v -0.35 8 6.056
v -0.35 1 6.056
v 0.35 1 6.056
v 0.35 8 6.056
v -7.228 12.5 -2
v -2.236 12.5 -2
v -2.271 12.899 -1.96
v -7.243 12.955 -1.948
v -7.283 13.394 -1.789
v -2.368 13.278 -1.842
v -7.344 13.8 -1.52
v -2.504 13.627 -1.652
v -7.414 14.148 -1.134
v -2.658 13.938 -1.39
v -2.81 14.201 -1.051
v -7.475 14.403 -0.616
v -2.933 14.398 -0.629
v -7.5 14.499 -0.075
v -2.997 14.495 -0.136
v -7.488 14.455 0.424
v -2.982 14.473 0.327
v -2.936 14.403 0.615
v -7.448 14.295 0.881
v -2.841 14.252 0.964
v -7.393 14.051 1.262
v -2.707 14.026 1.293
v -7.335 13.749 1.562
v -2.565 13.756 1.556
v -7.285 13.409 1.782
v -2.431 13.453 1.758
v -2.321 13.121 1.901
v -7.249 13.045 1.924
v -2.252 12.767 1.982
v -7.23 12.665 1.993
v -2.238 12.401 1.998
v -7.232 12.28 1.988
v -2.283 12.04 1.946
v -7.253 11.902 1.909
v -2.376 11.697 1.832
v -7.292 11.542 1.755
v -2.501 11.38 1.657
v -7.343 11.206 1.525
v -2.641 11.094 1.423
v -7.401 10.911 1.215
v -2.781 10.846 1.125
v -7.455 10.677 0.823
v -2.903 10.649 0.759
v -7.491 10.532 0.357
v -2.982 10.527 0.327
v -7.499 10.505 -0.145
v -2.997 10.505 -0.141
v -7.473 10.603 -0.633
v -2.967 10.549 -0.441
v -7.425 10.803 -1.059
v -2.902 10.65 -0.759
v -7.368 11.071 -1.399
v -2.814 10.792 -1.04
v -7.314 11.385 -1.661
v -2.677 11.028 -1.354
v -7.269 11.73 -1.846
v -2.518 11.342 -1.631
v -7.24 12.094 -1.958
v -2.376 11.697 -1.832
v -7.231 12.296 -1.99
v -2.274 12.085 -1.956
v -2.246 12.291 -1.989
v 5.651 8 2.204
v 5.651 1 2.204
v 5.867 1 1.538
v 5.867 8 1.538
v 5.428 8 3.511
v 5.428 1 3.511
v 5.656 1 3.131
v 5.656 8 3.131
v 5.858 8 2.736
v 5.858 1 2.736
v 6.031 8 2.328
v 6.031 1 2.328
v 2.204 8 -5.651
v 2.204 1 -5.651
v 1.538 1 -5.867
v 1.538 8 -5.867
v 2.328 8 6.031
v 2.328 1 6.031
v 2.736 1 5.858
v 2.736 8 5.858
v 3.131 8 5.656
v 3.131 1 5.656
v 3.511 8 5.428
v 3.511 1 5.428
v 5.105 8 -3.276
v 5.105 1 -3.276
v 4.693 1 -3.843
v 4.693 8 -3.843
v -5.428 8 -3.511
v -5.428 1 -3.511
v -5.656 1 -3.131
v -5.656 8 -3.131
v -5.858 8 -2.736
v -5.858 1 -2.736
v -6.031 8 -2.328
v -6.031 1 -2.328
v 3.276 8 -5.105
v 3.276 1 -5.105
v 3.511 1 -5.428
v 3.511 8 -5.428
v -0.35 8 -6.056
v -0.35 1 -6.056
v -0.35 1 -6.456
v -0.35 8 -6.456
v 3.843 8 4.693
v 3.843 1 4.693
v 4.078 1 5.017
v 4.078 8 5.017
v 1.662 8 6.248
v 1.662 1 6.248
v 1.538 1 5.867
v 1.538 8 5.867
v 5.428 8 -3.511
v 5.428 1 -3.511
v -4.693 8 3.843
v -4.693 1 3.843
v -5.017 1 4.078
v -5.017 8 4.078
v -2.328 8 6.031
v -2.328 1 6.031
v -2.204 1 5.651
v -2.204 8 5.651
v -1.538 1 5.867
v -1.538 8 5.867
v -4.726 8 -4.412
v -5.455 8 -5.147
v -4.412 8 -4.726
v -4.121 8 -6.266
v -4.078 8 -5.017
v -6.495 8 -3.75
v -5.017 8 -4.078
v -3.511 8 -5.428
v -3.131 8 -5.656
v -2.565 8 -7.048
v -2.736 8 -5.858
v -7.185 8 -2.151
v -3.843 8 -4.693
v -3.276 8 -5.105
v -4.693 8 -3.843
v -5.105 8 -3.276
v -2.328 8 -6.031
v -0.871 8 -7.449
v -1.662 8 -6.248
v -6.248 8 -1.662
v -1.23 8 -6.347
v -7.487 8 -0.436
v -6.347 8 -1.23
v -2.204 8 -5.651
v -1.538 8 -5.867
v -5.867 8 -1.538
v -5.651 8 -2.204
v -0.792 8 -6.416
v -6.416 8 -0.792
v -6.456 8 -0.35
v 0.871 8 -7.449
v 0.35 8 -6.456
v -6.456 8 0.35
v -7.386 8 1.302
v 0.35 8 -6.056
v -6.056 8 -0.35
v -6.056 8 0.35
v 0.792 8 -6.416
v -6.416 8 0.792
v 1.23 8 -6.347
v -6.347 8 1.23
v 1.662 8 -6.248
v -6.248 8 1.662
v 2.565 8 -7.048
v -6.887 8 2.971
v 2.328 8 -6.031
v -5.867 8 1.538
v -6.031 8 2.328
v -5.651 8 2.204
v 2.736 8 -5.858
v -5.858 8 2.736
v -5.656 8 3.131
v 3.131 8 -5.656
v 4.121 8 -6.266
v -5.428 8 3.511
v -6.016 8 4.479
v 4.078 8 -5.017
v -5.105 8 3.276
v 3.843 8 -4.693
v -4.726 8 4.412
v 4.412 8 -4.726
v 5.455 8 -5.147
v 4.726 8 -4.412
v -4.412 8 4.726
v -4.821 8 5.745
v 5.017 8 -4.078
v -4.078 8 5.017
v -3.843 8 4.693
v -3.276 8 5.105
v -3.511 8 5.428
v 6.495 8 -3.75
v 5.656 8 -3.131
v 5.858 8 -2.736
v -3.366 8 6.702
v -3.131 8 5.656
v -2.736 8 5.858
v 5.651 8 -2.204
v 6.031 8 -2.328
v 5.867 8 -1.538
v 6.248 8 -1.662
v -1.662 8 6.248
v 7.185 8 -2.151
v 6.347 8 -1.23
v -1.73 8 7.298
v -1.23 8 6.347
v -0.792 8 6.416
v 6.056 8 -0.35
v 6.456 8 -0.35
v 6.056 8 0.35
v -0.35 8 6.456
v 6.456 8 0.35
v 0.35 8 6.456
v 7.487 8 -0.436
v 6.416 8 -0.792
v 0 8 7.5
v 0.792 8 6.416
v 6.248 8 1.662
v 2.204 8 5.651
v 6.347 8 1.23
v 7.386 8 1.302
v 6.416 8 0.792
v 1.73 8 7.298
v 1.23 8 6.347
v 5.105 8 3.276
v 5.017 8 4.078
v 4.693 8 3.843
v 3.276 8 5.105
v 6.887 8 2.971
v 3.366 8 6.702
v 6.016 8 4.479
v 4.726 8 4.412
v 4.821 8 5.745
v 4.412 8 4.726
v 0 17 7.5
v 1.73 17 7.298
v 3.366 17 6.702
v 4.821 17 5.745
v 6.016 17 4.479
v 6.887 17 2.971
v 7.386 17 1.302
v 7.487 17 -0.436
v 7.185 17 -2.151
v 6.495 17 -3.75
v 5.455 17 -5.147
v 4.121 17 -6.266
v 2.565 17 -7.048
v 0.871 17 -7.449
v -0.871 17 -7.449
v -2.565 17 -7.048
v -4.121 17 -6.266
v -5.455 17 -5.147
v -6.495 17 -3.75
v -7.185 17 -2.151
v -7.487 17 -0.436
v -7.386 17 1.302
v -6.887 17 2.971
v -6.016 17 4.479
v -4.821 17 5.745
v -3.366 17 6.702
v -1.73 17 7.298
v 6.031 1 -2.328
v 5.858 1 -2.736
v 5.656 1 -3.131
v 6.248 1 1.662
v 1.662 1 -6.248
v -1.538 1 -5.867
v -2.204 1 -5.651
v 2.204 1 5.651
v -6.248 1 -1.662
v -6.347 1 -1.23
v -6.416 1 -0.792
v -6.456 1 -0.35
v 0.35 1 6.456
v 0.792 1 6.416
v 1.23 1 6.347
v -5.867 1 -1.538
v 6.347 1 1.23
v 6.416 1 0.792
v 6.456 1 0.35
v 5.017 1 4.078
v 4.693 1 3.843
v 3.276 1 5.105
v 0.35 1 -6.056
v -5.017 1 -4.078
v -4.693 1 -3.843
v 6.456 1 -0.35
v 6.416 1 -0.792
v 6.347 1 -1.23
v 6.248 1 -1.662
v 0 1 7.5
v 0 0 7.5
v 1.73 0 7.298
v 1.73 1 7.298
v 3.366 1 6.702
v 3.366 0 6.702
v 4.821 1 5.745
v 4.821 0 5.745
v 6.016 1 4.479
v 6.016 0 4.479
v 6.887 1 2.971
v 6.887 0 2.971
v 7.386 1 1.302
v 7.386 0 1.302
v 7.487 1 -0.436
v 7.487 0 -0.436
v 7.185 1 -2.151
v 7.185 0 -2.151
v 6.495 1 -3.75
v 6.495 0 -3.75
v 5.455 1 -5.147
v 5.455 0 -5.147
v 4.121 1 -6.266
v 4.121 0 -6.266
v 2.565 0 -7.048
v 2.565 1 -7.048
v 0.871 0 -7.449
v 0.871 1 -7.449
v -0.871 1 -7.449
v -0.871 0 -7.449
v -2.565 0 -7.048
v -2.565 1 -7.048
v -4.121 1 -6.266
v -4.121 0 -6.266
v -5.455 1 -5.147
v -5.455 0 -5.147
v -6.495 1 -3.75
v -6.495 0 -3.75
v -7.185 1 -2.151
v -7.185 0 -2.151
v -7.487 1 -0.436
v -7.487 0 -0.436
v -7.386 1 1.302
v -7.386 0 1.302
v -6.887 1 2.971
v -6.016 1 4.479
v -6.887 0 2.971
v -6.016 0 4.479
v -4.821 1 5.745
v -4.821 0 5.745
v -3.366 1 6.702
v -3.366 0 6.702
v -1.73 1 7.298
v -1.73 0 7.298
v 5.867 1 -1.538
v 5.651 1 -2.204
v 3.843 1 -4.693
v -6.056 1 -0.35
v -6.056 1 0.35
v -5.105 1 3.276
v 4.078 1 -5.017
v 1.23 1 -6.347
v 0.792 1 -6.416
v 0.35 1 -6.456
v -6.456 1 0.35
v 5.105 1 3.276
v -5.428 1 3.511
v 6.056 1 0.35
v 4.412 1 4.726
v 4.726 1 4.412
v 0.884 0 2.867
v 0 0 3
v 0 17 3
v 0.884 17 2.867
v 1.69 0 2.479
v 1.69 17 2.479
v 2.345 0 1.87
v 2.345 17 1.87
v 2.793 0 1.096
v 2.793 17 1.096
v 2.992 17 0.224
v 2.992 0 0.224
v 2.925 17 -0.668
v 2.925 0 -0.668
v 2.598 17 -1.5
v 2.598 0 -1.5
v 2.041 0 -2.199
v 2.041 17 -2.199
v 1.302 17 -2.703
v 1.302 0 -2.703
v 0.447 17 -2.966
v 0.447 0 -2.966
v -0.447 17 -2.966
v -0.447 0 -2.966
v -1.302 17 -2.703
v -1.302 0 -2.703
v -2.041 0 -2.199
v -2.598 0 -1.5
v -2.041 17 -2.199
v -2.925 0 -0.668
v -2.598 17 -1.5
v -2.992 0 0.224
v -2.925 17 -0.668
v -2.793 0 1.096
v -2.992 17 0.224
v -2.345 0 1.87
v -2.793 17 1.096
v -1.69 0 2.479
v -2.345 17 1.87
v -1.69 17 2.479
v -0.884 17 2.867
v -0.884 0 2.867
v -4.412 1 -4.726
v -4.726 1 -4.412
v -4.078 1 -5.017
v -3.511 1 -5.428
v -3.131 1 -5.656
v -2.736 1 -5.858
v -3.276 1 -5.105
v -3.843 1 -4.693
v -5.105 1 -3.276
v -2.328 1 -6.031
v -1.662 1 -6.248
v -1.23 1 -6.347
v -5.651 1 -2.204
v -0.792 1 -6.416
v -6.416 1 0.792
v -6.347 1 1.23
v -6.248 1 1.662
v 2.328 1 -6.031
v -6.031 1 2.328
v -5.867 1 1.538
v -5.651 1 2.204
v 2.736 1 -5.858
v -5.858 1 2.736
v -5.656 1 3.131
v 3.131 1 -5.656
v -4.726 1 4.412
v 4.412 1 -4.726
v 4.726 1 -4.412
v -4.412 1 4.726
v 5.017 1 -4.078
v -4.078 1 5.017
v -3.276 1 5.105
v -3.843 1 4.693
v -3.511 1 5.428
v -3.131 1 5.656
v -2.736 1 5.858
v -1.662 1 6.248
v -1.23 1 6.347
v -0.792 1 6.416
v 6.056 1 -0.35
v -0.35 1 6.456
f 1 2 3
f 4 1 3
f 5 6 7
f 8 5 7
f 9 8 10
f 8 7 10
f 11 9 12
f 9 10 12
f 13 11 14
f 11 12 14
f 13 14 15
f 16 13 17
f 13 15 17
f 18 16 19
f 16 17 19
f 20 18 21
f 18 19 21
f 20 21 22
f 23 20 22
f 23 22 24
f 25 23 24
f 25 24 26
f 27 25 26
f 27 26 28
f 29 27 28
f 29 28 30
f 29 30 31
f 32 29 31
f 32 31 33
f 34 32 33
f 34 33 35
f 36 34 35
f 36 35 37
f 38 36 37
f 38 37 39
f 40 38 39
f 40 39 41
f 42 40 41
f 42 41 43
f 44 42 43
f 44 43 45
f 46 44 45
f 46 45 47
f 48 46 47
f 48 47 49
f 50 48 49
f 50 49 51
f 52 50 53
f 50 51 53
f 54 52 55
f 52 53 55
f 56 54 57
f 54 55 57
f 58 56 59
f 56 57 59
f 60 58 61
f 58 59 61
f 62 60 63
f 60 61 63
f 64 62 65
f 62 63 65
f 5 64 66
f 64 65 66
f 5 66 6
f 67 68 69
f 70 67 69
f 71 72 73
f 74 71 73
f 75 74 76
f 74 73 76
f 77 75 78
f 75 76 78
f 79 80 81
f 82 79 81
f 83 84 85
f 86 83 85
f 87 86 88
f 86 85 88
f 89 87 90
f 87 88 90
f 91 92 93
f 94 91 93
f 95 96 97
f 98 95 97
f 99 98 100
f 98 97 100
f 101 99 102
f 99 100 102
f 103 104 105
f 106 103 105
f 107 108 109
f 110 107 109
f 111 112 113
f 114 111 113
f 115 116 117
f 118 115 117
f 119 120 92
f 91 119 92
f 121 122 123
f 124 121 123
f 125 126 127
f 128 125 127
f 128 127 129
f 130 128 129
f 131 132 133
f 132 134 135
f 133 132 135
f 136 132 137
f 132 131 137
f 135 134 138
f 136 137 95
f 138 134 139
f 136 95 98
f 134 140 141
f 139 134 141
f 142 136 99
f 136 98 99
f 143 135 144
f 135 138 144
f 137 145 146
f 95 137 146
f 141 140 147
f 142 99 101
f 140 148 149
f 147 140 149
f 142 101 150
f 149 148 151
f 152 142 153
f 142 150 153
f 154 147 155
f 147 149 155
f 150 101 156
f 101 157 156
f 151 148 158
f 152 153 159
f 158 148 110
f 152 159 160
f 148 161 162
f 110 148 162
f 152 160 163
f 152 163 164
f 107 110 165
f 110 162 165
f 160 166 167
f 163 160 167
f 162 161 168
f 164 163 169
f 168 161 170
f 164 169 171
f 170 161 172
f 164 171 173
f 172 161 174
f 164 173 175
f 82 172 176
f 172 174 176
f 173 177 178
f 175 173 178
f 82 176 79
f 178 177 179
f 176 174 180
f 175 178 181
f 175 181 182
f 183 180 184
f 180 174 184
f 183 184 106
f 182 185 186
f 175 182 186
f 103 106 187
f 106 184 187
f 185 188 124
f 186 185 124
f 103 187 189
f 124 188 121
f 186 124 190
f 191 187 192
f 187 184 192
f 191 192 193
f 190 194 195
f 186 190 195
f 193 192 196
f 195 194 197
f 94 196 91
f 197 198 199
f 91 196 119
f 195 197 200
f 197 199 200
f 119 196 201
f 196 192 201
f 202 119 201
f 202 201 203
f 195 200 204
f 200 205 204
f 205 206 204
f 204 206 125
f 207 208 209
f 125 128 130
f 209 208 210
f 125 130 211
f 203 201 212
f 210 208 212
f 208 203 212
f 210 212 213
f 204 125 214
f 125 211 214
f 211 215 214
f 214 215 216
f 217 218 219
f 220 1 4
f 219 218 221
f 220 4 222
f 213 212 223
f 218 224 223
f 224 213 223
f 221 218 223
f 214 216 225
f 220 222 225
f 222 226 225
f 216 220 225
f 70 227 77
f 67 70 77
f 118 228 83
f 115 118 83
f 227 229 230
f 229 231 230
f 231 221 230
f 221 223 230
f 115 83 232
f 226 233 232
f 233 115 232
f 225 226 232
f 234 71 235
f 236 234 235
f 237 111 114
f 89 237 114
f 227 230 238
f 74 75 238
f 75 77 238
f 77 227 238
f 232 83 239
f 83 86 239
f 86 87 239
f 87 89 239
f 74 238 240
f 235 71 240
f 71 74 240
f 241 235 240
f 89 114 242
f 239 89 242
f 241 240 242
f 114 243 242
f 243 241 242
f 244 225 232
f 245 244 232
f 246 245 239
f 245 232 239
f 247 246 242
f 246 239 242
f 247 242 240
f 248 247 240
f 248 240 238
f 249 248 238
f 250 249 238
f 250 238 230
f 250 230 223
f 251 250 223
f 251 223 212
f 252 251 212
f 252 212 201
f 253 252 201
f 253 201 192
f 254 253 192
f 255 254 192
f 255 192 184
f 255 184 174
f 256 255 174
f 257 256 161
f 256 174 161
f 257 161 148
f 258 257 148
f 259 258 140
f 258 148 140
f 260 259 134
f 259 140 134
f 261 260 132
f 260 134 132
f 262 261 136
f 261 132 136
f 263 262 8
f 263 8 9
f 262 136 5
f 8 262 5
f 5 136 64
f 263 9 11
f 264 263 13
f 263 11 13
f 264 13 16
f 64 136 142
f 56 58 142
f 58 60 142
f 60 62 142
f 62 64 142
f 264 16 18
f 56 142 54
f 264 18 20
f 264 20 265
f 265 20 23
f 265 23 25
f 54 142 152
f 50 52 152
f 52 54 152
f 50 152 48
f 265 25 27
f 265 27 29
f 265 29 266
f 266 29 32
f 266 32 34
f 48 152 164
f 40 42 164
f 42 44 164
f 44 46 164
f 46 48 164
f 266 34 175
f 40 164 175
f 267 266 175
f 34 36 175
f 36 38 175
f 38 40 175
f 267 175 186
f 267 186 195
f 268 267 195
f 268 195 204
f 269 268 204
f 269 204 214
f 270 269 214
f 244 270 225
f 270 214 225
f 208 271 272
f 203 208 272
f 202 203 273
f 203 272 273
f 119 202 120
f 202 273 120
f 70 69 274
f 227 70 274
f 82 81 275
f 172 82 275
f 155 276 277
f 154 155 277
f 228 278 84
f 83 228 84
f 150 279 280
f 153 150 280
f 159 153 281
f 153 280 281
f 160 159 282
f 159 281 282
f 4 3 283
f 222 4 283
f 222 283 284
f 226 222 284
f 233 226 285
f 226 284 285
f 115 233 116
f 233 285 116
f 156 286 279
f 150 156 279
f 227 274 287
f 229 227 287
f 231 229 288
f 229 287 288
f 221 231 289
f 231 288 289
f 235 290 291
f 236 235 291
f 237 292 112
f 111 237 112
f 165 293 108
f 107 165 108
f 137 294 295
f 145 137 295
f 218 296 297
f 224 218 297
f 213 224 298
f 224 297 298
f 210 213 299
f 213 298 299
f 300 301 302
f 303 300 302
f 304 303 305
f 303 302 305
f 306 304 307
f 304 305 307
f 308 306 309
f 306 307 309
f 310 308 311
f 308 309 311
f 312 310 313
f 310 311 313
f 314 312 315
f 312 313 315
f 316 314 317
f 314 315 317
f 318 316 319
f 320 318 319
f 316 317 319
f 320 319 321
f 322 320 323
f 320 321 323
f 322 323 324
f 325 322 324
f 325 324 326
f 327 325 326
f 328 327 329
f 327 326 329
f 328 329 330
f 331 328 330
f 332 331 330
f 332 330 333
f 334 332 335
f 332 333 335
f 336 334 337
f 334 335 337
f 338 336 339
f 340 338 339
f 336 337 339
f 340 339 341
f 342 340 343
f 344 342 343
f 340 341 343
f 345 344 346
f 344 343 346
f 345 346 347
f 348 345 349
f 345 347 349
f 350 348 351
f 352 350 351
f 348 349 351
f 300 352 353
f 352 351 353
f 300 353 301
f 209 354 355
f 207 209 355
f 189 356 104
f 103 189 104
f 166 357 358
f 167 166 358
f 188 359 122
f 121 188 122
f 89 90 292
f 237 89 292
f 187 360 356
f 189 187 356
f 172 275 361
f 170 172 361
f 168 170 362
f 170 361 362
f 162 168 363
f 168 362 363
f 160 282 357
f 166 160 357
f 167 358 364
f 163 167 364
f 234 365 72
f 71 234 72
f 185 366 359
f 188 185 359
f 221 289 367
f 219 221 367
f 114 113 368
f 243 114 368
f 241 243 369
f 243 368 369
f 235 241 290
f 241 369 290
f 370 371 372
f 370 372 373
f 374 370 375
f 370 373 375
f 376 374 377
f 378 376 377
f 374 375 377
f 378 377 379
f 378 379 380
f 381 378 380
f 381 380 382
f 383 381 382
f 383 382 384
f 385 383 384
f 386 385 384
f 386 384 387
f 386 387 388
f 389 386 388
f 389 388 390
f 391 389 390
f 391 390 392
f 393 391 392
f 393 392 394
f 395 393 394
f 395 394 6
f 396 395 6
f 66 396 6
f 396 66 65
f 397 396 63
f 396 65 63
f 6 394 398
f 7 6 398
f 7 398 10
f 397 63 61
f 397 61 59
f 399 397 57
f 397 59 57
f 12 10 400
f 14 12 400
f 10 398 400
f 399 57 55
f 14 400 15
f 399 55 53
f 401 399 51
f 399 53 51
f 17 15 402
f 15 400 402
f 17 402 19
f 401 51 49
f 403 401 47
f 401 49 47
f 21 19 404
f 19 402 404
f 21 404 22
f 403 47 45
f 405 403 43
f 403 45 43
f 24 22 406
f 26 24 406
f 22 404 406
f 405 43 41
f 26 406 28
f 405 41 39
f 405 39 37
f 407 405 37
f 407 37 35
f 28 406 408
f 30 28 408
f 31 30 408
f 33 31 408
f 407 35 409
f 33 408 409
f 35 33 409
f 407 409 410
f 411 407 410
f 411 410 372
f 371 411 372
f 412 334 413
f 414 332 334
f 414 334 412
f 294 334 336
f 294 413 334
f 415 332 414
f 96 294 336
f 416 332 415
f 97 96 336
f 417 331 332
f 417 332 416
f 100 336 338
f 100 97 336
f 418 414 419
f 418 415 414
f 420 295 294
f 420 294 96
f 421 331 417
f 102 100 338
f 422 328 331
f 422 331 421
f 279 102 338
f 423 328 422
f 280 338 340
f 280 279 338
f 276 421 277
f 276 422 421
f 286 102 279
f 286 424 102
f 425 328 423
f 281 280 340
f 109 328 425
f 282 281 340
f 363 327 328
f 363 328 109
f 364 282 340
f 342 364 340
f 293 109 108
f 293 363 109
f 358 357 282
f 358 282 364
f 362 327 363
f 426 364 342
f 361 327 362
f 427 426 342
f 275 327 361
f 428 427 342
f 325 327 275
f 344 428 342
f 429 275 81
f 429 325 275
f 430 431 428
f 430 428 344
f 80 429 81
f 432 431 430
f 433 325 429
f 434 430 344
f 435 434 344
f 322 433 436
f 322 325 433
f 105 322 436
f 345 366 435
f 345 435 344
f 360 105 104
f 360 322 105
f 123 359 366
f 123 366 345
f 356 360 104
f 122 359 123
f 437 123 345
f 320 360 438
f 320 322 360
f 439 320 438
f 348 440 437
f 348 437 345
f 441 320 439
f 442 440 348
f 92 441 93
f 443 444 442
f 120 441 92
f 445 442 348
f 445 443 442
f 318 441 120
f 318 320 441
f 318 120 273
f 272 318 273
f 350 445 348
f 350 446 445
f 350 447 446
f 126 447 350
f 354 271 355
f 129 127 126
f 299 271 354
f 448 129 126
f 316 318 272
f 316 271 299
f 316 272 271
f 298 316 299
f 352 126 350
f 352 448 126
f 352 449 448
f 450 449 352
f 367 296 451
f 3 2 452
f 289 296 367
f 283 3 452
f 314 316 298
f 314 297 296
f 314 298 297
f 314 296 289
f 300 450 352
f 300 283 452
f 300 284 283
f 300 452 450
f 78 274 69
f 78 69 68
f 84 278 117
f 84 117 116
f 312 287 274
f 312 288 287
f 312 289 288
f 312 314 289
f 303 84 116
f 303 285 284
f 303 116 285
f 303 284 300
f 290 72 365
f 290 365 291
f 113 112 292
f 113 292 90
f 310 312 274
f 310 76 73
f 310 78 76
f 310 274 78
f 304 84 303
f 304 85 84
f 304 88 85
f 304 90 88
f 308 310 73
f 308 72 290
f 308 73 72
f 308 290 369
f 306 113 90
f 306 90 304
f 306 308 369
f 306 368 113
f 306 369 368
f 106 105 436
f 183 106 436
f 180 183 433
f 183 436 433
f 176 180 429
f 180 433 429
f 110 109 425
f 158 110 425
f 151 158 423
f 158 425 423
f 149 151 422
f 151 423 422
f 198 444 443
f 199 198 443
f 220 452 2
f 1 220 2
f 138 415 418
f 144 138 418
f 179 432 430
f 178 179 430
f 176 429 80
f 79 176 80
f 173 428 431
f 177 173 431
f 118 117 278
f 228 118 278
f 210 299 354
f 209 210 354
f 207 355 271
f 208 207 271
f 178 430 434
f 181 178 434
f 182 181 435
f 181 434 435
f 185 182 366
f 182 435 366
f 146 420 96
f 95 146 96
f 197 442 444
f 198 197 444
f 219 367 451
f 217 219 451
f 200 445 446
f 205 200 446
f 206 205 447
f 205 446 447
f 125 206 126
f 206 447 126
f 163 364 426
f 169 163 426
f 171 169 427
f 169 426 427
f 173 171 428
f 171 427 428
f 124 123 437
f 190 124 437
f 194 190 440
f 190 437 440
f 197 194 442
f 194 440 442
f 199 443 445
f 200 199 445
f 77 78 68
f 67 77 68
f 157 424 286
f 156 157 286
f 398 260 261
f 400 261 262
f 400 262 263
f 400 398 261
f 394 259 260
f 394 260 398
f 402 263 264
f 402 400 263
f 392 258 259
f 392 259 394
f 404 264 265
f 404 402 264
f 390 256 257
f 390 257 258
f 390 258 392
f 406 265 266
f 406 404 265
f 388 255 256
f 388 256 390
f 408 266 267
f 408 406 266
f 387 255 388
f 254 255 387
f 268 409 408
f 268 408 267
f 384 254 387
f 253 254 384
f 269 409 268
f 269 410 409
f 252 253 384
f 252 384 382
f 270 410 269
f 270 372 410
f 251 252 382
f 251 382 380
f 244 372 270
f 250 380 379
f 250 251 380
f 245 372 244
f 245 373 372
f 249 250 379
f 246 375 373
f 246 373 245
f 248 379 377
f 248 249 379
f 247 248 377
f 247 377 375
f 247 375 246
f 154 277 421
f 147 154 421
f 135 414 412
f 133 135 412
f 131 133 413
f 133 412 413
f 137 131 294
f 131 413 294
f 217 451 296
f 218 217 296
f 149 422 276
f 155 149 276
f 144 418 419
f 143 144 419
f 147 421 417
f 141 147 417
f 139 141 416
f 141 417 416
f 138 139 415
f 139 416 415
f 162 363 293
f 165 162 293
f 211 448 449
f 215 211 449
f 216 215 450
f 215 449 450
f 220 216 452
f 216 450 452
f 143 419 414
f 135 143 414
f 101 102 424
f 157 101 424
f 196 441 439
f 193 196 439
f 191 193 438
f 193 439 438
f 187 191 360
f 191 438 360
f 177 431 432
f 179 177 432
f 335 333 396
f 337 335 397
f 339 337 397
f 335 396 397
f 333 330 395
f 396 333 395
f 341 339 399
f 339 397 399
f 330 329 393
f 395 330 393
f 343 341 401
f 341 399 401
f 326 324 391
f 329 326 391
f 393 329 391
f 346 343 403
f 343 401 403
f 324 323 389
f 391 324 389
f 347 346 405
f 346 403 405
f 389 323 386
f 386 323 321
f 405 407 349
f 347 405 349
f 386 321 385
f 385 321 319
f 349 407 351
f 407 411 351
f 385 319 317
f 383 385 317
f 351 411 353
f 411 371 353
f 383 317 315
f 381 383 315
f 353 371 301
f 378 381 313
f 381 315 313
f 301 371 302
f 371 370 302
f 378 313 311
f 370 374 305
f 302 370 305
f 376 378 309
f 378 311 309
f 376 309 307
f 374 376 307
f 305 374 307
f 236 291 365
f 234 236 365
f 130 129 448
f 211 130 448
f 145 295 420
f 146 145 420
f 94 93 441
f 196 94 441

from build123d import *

# Parameters (mm, degrees)
SKETCH_1_R               = 7.5
EXTRUDE_1_DEPTH          = 1
EXTRUDE_2_DEPTH          = 7
SKETCH_3_R               = 7.5
EXTRUDE_3_DEPTH          = 9
CUT_EXTRUDE_1_REACH      = 22.037
SKETCH_4_R               = 3
CUT_EXTRUDE_2_REACH      = 22.037
CUT_EXTRUDE_2_END_RADIUS = 7.5
SKETCH_5_R               = 2


with BuildPart() as part:
    # 草图1 → 凸台-拉伸1 (new body)
    with BuildSketch(Plane(origin=(0, 0, 0), x_dir=(1, 0, 0), z_dir=(0, 1, 0))):
        with Locations(Location((0, 0, 0), (0, 0, 270))):
            Circle(SKETCH_1_R)
    extrude(amount=EXTRUDE_1_DEPTH)

    # 草图2 → 凸台-拉伸2 (add)
    with BuildSketch(Plane(origin=(0, 1, 0), x_dir=(1, 0, 0), z_dir=(0, 1, 0))):
        with BuildLine():
            Line((-0.35, 6.055518957), (-0.35, 6.455518957))
            ThreePointArc((-0.35, 6.455518957), (-1.011348816, 6.385405122), (-1.661995284, 6.247719318))
            Line((-1.661995284, 6.247719318), (-1.538388487, 5.867296711))
            Line((-1.538388487, 5.867296711), (-2.204128048, 5.650984815))
            Line((-2.204128048, 5.650984815), (-2.327734846, 6.031407422))
            ThreePointArc((-2.327734846, 6.031407422), (-2.935048581, 5.760357179), (-3.511302891, 5.428349382))
            Line((-3.511302891, 5.428349382), (-3.27618879, 5.104742584))
            Line((-3.27618879, 5.104742584), (-3.842500686, 4.693292907))
            Line((-3.842500686, 4.693292907), (-4.077614787, 5.016899705))
            ThreePointArc((-4.077614787, 5.016899705), (-4.57144534, 4.57144534), (-5.016899705, 4.077614787))
            Line((-5.016899705, 4.077614787), (-4.693292907, 3.842500686))
            Line((-4.693292907, 3.842500686), (-5.104742584, 3.27618879))
            Line((-5.104742584, 3.27618879), (-5.428349382, 3.511302891))
            ThreePointArc((-5.428349382, 3.511302891), (-5.760357179, 2.935048581), (-6.031407422, 2.327734846))
            Line((-6.031407422, 2.327734846), (-5.650984815, 2.204128048))
            Line((-5.650984815, 2.204128048), (-5.867296711, 1.538388487))
            Line((-5.867296711, 1.538388487), (-6.247719318, 1.661995284))
            ThreePointArc((-6.247719318, 1.661995284), (-6.385405122, 1.011348816), (-6.455518957, 0.35))
            Line((-6.455518957, 0.35), (-6.055518957, 0.35))
            Line((-6.055518957, 0.35), (-6.055518957, -0.35))
            Line((-6.055518957, -0.35), (-6.455518957, -0.35))
            ThreePointArc((-6.455518957, -0.35), (-6.385405122, -1.011348816), (-6.247719318, -1.661995284))
            Line((-6.247719318, -1.661995284), (-5.867296711, -1.538388487))
            Line((-5.867296711, -1.538388487), (-5.650984815, -2.204128048))
            Line((-5.650984815, -2.204128048), (-6.031407422, -2.327734846))
            ThreePointArc((-6.031407422, -2.327734846), (-5.760357179, -2.935048581), (-5.428349382, -3.511302891))
            Line((-5.428349382, -3.511302891), (-5.104742584, -3.27618879))
            Line((-5.104742584, -3.27618879), (-4.693292907, -3.842500686))
            Line((-4.693292907, -3.842500686), (-5.016899705, -4.077614787))
            ThreePointArc((-5.016899705, -4.077614787), (-4.57144534, -4.57144534), (-4.077614787, -5.016899705))
            Line((-4.077614787, -5.016899705), (-3.842500686, -4.693292907))
            Line((-3.842500686, -4.693292907), (-3.27618879, -5.104742584))
            Line((-3.27618879, -5.104742584), (-3.511302891, -5.428349382))
            ThreePointArc((-3.511302891, -5.428349382), (-2.935048581, -5.760357179), (-2.327734846, -6.031407422))
            Line((-2.327734846, -6.031407422), (-2.204128048, -5.650984815))
            Line((-2.204128048, -5.650984815), (-1.538388487, -5.867296711))
            Line((-1.538388487, -5.867296711), (-1.661995284, -6.247719318))
            ThreePointArc((-1.661995284, -6.247719318), (-1.011348816, -6.385405122), (-0.35, -6.455518957))
            Line((-0.35, -6.455518957), (-0.35, -6.055518957))
            Line((-0.35, -6.055518957), (0.35, -6.055518957))
            Line((0.35, -6.055518957), (0.35, -6.455518957))
            ThreePointArc((0.35, -6.455518957), (1.011348816, -6.385405122), (1.661995284, -6.247719318))
            Line((1.661995284, -6.247719318), (1.538388487, -5.867296711))
            Line((1.538388487, -5.867296711), (2.204128048, -5.650984815))
            Line((2.204128048, -5.650984815), (2.327734846, -6.031407422))
            ThreePointArc((2.327734846, -6.031407422), (2.935048581, -5.760357179), (3.511302891, -5.428349382))
            Line((3.511302891, -5.428349382), (3.27618879, -5.104742584))
            Line((3.27618879, -5.104742584), (3.842500686, -4.693292907))
            Line((3.842500686, -4.693292907), (4.077614787, -5.016899705))
            ThreePointArc((4.077614787, -5.016899705), (4.57144534, -4.57144534), (5.016899705, -4.077614787))
            Line((5.016899705, -4.077614787), (4.693292907, -3.842500686))
            Line((4.693292907, -3.842500686), (5.104742584, -3.27618879))
            Line((5.104742584, -3.27618879), (5.428349382, -3.511302891))
            ThreePointArc((5.428349382, -3.511302891), (5.760357179, -2.935048581), (6.031407422, -2.327734846))
            Line((6.031407422, -2.327734846), (5.650984815, -2.204128048))
            Line((5.650984815, -2.204128048), (5.867296711, -1.538388487))
            Line((5.867296711, -1.538388487), (6.247719318, -1.661995284))
            ThreePointArc((6.247719318, -1.661995284), (6.385405122, -1.011348816), (6.455518957, -0.35))
            Line((6.455518957, -0.35), (6.055518957, -0.35))
            Line((6.055518957, -0.35), (6.055518957, 0.35))
            Line((6.055518957, 0.35), (6.455518957, 0.35))
            ThreePointArc((6.455518957, 0.35), (6.385405122, 1.011348816), (6.247719318, 1.661995284))
            Line((6.247719318, 1.661995284), (5.867296711, 1.538388487))
            Line((5.867296711, 1.538388487), (5.650984815, 2.204128048))
            Line((5.650984815, 2.204128048), (6.031407422, 2.327734846))
            ThreePointArc((6.031407422, 2.327734846), (5.760357179, 2.935048581), (5.428349382, 3.511302891))
            Line((5.428349382, 3.511302891), (5.104742584, 3.27618879))
            Line((5.104742584, 3.27618879), (4.693292907, 3.842500686))
            Line((4.693292907, 3.842500686), (5.016899705, 4.077614787))
            ThreePointArc((5.016899705, 4.077614787), (4.57144534, 4.57144534), (4.077614787, 5.016899705))
            Line((4.077614787, 5.016899705), (3.842500686, 4.693292907))
            Line((3.842500686, 4.693292907), (3.27618879, 5.104742584))
            Line((3.27618879, 5.104742584), (3.511302891, 5.428349382))
            ThreePointArc((3.511302891, 5.428349382), (2.935048581, 5.760357179), (2.327734846, 6.031407422))
            Line((2.327734846, 6.031407422), (2.204128048, 5.650984815))
            Line((2.204128048, 5.650984815), (1.538388487, 5.867296711))
            Line((1.538388487, 5.867296711), (1.661995284, 6.247719318))
            ThreePointArc((1.661995284, 6.247719318), (1.011348816, 6.385405122), (0.35, 6.455518957))
            Line((0.35, 6.455518957), (0.35, 6.055518957))
            Line((0.35, 6.055518957), (-0.35, 6.055518957))
        make_face()
    extrude(amount=EXTRUDE_2_DEPTH)

    # 草图3 → 凸台-拉伸3 (add)
    with BuildSketch(Plane(origin=(0, 8, 0), x_dir=(1, 0, 0), z_dir=(0, 1, 0))):
        with Locations(Location((0, 0, 0), (0, 0, 270))):
            Circle(SKETCH_3_R)
    extrude(amount=EXTRUDE_3_DEPTH)

    # 草图4 → 切除-拉伸1 (cut, up to next)
    with BuildSketch(Plane(origin=(0, 17, 0), x_dir=(1, 0, 0), z_dir=(0, 1, 0)), mode=Mode.PRIVATE) as cut_extrude_1_sk1:
        with Locations(Location((0, 0, 0), (0, 0, 270))):
            Circle(SKETCH_4_R)
    cut_extrude_1_tool1 = extrude(cut_extrude_1_sk1.sketch, amount=-CUT_EXTRUDE_1_REACH, mode=Mode.PRIVATE) & part.part
    add(cut_extrude_1_tool1.solids().sort_by_distance((0, 17, 0))[0], mode=Mode.SUBTRACT)

    # 切除-拉伸2: up to this cylinder (the profile starts inside it)
    cut_extrude_2_end = Plane(origin=(0, 12.5, 0), z_dir=(0, -1, 0)) * Cylinder(CUT_EXTRUDE_2_END_RADIUS, 60.074, mode=Mode.PRIVATE)
    # 草图5 → 切除-拉伸2 (cut, up to the surface)
    with BuildSketch(Plane(origin=(0, 0, 0), x_dir=(0, 0, -1), z_dir=(1, 0, 0)), mode=Mode.PRIVATE) as cut_extrude_2_sk1:
        with Locations((0, 12.5)):
            Circle(SKETCH_5_R)
    cut_extrude_2_tool1 = extrude(cut_extrude_2_sk1.sketch, amount=-CUT_EXTRUDE_2_REACH, mode=Mode.PRIVATE) & cut_extrude_2_end
    add(cut_extrude_2_tool1.solids().sort_by_distance((0, 12.5, 0))[0], mode=Mode.SUBTRACT)


solid = part.part
